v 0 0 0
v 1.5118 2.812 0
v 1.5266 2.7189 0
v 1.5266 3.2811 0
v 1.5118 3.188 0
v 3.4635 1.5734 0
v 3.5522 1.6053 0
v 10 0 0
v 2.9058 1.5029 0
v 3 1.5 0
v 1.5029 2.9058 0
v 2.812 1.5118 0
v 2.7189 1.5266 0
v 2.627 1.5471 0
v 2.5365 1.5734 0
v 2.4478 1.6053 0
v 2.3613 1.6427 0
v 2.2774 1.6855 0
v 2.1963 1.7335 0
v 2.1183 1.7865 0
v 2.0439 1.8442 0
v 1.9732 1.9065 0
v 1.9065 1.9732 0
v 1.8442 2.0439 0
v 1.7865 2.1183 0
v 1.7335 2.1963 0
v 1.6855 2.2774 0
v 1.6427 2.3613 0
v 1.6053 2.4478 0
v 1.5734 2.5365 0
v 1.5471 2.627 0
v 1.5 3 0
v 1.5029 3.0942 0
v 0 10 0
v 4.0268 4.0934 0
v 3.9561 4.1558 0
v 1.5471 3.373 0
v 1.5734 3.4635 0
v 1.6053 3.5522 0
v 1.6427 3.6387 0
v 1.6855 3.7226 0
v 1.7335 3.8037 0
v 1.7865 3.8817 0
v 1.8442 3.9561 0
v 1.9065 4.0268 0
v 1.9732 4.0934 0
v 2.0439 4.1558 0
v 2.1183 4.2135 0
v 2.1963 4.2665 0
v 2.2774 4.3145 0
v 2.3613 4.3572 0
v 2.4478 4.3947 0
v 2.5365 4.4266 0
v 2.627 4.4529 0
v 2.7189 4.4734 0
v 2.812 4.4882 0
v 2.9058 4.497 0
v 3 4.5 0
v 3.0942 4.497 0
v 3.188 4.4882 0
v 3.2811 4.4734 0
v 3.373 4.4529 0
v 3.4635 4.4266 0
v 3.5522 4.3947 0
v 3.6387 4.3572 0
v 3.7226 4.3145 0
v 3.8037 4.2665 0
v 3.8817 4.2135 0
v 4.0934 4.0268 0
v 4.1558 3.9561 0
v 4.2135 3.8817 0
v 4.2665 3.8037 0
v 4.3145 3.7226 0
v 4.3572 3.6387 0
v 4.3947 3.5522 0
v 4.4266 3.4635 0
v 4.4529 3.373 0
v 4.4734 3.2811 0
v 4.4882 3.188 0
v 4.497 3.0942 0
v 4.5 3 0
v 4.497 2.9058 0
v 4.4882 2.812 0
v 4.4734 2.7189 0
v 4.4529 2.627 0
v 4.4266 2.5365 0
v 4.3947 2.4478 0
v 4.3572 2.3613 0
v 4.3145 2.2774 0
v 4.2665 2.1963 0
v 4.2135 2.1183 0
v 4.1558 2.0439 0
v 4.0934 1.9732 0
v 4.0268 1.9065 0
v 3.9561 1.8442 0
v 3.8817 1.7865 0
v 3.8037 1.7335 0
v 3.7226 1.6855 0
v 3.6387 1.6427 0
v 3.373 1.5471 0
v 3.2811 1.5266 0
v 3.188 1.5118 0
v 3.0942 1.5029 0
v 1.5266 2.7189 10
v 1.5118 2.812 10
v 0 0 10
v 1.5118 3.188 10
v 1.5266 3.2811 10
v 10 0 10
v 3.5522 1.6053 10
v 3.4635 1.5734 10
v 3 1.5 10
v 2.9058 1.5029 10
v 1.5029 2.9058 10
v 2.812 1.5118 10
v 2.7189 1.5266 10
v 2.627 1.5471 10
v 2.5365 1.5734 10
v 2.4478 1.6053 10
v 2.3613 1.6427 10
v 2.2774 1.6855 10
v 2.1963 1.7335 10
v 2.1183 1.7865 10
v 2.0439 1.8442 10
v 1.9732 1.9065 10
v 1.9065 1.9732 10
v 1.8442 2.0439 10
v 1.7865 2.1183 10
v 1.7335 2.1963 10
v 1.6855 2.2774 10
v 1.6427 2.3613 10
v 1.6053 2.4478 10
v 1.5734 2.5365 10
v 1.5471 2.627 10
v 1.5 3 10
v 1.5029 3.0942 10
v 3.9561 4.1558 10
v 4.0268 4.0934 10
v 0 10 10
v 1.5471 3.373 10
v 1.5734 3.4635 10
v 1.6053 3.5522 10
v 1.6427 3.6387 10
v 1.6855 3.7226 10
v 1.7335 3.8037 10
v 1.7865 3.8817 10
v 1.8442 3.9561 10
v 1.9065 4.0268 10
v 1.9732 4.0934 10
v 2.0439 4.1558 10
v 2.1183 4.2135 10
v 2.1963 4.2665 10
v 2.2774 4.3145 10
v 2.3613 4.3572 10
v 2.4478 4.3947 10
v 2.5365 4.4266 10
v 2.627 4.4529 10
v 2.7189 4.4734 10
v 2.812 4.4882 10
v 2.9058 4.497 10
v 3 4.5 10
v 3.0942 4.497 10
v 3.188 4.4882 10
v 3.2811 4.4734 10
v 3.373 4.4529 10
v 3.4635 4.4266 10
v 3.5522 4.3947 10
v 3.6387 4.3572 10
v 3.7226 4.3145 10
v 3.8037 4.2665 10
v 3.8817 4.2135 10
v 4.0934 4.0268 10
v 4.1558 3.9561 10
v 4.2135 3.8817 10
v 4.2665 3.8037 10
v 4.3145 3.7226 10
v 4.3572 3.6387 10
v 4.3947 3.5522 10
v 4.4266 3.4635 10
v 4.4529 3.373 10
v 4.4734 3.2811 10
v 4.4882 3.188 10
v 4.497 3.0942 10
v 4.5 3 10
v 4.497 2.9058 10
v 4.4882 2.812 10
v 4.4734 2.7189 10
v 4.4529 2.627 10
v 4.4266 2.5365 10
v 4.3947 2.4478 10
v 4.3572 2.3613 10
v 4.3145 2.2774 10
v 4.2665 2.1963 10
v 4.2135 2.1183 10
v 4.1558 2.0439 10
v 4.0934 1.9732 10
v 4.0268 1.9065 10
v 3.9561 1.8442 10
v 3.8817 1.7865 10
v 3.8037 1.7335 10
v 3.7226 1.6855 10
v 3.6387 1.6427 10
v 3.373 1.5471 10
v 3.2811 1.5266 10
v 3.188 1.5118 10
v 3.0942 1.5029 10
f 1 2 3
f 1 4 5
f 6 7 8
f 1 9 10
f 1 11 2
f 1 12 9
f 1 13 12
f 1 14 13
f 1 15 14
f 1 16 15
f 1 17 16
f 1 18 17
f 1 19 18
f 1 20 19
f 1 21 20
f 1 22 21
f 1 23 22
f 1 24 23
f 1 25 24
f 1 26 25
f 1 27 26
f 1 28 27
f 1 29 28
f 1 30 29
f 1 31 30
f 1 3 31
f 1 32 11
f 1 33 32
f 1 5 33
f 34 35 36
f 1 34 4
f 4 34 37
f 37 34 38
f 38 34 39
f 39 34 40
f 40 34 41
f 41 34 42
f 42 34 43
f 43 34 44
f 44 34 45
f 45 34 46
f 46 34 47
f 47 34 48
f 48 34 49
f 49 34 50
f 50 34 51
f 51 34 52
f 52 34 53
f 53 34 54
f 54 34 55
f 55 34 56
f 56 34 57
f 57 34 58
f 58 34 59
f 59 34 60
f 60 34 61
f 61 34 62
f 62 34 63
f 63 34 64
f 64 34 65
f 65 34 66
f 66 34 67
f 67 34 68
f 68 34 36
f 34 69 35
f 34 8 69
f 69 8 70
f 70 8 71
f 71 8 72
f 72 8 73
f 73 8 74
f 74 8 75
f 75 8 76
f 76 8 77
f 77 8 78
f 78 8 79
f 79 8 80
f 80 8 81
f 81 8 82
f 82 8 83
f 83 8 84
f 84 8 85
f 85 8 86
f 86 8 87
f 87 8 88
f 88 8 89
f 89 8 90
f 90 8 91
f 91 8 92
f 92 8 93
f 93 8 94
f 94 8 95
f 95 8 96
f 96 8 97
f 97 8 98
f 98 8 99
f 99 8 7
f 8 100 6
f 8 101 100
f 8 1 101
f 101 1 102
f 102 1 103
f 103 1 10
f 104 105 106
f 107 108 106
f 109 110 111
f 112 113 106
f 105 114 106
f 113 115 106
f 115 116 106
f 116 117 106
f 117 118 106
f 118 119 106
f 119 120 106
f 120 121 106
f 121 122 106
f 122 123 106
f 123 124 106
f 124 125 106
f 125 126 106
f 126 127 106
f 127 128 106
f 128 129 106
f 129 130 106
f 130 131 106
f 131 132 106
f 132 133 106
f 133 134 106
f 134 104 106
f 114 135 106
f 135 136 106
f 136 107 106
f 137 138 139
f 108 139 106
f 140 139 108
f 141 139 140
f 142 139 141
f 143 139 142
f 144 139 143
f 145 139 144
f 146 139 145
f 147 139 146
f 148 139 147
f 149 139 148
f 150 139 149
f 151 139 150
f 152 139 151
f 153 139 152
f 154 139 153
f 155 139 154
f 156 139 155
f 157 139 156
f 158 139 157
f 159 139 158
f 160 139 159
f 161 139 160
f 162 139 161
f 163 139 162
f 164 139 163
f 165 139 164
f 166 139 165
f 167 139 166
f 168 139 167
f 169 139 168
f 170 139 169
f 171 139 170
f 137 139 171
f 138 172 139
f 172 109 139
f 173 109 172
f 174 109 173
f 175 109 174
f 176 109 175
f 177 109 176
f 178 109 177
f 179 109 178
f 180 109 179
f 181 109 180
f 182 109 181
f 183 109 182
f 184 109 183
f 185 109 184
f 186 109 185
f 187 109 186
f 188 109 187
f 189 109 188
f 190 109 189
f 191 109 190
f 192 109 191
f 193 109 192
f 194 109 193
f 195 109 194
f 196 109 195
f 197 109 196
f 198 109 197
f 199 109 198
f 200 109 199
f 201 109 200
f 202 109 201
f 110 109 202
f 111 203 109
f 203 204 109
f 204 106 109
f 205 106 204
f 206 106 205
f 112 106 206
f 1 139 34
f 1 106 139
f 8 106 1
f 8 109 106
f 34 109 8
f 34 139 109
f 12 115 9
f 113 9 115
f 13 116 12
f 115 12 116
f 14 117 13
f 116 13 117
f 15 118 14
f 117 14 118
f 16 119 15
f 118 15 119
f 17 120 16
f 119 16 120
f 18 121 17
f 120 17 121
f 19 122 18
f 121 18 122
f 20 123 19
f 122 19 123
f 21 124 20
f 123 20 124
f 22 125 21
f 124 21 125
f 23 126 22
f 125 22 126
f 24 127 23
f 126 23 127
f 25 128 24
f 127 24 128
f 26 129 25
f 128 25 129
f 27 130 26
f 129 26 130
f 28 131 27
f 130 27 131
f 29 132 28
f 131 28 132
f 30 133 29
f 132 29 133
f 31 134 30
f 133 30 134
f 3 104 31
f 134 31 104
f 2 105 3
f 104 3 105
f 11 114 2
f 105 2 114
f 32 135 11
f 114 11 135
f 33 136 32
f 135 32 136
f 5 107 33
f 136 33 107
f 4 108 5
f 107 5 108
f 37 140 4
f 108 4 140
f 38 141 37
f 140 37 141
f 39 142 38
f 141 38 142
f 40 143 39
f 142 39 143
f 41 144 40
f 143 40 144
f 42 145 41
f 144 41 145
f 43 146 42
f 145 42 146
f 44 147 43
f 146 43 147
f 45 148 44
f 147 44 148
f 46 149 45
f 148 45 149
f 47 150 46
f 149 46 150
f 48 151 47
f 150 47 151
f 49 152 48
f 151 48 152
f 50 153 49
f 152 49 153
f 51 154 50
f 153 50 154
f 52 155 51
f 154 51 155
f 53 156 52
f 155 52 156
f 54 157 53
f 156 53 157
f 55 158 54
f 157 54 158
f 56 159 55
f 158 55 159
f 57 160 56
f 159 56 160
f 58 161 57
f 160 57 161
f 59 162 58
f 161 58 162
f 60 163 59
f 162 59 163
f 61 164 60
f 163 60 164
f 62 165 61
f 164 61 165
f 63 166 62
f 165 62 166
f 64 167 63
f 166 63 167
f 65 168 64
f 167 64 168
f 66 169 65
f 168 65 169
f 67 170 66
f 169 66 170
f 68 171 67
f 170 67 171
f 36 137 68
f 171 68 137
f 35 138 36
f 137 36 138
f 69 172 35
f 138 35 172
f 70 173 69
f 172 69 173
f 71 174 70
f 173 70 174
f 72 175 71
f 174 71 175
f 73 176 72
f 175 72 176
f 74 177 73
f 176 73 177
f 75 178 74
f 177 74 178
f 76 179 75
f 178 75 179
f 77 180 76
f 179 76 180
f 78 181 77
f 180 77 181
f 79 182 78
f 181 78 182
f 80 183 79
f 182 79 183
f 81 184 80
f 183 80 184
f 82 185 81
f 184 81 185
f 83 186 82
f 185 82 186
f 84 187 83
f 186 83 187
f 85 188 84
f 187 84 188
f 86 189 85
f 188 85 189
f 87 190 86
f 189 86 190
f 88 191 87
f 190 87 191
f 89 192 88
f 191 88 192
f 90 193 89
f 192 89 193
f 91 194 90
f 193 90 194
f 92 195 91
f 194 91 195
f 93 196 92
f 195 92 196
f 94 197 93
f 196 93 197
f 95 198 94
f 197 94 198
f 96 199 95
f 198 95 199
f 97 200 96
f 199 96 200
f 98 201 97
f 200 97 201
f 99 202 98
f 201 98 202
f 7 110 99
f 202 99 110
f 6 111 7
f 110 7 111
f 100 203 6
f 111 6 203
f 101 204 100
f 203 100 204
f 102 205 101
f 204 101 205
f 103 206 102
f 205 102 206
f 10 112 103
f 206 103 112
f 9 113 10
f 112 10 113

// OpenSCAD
hole_offset = 3;

module screw_mount(){
    linear_extrude(height=10)
    difference() {
        polygon(points = [[0,0],[10,0],[0,10]]);
        translate([hole_offset,hole_offset,0])
        circle(d=3, $fn=100);
    }
}
screw_mount();
